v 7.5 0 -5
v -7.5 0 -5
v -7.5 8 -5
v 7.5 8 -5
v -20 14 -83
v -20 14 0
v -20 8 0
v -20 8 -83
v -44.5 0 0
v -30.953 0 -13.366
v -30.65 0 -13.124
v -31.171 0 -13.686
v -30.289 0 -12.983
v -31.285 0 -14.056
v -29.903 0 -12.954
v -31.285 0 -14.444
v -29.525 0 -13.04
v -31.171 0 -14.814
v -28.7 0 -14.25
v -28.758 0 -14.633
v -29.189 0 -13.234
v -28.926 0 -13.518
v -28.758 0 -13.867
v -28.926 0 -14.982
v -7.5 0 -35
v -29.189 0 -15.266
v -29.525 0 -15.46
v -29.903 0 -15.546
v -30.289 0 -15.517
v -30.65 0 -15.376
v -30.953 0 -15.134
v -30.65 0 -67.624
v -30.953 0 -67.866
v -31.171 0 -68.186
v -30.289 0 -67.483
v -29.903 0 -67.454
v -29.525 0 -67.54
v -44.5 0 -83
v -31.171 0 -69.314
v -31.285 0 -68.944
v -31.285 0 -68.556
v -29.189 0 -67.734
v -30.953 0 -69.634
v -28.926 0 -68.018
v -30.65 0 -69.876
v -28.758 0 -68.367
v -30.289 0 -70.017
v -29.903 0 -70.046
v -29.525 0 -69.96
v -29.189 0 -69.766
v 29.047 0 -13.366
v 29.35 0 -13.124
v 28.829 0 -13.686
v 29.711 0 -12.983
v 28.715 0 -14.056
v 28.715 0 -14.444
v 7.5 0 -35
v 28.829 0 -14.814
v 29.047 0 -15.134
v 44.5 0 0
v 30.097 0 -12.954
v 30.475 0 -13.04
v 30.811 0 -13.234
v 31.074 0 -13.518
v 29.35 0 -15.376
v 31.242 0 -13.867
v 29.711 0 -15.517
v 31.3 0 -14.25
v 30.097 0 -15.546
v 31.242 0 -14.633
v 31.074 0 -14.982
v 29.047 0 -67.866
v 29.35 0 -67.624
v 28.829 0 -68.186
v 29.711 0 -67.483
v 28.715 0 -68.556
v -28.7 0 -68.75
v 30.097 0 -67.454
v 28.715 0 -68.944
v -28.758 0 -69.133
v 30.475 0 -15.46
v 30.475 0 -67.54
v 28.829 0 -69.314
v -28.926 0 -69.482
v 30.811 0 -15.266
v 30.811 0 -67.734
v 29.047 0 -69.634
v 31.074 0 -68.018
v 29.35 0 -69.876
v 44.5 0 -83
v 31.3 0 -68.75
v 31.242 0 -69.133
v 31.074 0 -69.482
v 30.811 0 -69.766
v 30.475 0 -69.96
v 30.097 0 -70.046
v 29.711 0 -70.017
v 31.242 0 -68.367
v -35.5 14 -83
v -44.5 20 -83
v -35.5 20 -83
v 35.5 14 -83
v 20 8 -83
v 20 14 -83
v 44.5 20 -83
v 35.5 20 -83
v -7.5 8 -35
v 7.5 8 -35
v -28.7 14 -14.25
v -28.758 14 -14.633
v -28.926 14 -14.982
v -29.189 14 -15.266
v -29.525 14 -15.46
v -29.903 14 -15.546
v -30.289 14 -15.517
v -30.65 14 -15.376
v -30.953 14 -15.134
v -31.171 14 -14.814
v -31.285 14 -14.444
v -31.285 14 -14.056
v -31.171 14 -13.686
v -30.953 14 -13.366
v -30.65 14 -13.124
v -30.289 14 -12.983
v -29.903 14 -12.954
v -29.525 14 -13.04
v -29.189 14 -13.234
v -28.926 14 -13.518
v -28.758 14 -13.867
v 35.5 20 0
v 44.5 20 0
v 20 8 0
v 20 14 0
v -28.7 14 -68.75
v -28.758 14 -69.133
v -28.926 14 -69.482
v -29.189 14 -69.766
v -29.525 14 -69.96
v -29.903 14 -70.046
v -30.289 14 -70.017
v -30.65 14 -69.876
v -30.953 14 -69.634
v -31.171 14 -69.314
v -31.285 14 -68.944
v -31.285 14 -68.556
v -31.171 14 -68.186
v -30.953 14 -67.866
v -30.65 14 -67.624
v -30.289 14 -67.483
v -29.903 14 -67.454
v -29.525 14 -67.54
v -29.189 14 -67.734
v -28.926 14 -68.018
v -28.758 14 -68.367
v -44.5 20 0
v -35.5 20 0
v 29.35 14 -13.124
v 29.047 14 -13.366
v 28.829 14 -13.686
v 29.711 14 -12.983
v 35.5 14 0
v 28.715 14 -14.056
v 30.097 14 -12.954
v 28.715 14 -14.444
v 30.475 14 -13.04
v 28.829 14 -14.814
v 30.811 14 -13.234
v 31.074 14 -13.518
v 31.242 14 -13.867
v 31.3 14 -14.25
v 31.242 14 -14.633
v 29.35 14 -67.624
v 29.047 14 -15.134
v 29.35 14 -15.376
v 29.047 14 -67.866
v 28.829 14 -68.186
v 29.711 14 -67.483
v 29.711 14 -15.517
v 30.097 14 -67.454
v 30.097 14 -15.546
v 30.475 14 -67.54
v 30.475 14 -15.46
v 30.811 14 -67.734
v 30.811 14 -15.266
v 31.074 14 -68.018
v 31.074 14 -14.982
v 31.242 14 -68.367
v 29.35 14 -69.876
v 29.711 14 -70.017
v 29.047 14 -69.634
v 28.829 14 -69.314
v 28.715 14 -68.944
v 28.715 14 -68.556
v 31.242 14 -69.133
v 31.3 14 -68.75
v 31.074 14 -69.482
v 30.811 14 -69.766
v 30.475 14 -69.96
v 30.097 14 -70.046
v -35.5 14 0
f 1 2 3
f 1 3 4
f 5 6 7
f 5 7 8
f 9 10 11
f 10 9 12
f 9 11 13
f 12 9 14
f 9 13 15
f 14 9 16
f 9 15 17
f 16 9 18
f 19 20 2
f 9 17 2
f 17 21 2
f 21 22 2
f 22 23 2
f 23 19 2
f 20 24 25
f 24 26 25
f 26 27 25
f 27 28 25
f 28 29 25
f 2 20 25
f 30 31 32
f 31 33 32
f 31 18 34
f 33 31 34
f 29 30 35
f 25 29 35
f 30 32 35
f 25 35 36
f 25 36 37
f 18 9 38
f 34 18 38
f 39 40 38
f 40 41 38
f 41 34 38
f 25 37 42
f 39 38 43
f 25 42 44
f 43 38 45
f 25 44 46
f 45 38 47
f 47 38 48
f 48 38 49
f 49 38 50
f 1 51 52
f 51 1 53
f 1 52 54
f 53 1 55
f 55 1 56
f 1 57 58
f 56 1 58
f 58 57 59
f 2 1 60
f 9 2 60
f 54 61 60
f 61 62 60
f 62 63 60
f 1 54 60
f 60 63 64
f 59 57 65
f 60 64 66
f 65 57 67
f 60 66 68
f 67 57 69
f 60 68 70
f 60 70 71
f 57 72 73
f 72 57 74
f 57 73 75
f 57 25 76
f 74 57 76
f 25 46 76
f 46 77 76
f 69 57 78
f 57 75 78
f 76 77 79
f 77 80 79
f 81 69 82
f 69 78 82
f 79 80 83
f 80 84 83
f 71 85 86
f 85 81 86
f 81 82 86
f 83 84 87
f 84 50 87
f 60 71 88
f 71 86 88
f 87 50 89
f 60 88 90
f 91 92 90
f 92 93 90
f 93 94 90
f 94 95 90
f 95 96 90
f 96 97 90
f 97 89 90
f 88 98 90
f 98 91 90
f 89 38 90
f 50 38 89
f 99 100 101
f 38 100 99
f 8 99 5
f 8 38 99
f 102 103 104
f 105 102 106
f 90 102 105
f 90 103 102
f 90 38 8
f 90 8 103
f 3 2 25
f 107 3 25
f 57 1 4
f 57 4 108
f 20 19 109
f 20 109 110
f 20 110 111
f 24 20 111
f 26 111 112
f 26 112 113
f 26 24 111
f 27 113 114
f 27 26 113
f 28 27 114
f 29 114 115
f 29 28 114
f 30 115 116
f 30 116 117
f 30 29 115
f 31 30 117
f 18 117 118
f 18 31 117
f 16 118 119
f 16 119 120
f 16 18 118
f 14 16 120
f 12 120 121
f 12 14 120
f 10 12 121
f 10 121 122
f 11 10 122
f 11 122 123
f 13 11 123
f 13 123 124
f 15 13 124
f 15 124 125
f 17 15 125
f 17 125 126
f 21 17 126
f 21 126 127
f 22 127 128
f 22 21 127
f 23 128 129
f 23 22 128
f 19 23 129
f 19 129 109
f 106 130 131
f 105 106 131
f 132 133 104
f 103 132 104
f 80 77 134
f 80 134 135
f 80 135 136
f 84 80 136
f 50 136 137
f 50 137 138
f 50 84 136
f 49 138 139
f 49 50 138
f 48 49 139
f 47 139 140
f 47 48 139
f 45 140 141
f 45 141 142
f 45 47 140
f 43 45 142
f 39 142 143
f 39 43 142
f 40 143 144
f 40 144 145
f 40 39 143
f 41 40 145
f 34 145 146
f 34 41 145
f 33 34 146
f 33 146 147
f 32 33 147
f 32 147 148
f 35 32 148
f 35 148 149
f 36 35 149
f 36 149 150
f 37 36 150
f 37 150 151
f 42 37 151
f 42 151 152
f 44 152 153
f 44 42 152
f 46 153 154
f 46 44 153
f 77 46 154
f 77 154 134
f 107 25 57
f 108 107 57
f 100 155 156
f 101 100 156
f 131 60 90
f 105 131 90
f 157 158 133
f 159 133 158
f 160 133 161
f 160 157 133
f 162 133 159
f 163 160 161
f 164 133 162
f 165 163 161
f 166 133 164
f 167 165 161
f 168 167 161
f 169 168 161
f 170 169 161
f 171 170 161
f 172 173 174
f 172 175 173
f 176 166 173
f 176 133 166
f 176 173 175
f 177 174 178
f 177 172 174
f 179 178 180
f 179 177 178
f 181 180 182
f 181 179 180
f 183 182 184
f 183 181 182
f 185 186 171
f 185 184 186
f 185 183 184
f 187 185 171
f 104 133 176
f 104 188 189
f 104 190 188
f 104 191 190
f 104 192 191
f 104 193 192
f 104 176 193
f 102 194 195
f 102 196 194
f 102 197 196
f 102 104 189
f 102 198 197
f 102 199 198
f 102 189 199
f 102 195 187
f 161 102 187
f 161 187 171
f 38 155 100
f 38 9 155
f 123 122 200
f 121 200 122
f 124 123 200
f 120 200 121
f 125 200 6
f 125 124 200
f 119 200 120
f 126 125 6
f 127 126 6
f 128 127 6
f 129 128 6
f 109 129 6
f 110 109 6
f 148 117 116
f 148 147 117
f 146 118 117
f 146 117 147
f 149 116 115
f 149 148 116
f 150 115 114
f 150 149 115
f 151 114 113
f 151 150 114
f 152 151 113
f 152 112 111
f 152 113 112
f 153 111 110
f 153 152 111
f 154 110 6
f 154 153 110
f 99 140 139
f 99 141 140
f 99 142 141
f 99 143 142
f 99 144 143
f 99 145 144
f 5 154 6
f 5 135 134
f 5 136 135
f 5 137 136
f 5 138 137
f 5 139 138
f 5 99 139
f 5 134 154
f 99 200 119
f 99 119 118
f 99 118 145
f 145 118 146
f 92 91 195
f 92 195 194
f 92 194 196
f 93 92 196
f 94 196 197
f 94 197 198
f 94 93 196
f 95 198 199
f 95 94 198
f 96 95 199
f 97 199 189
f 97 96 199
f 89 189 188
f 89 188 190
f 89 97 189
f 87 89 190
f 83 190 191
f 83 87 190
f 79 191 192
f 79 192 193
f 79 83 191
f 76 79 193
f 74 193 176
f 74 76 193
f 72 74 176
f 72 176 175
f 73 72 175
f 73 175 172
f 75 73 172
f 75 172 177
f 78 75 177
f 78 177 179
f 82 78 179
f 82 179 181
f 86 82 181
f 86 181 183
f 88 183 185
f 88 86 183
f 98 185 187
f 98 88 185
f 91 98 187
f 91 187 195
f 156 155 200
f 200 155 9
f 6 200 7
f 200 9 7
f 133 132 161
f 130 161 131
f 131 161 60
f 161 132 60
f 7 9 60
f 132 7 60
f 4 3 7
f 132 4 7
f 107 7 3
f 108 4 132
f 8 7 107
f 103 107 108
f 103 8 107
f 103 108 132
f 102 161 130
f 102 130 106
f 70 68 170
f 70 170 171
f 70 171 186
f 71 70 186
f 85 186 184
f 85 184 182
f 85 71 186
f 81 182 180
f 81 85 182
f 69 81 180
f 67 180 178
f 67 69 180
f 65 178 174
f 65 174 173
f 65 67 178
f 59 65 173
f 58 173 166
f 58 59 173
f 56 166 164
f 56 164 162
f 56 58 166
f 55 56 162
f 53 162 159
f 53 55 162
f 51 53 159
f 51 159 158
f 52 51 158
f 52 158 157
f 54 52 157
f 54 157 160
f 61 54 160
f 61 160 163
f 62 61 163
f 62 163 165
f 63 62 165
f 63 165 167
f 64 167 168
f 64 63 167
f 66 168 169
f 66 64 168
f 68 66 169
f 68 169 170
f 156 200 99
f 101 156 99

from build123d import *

# Parameters (mm, degrees)
SKETCH1_W           = 89
SKETCH1_H           = 83
SKETCH1_R           = 1.3
SKETCH1_W_2         = 15
SKETCH1_H_2         = 30
MAIN_BODY_DEPTH     = 14
SKETCH2_W           = 40
SKETCH2_H           = 83
SCREW_GROOVE_DEPTH  = 6
SKETCH4_W           = 9
SKETCH4_H           = 83
BOSS_EXTRUDE2_DEPTH = 6


with BuildPart() as part:
    # Sketch1 → Main Body (new body)
    with BuildSketch(Plane(origin=(0, 0, 0), x_dir=(1, 0, 0), z_dir=(0, 1, 0))):
        with Locations((0, 41.5)):
            Rectangle(SKETCH1_W, SKETCH1_H)
        with Locations((30, 68.75)):
            Circle(SKETCH1_R, mode=Mode.SUBTRACT)
        with Locations((-30, 68.75)):
            Circle(SKETCH1_R, mode=Mode.SUBTRACT)
        with Locations((-30, 14.25)):
            Circle(SKETCH1_R, mode=Mode.SUBTRACT)
        with Locations((30, 14.25)):
            Circle(SKETCH1_R, mode=Mode.SUBTRACT)
        with Locations((0, 20)):
            Rectangle(SKETCH1_W_2, SKETCH1_H_2, mode=Mode.SUBTRACT)
    extrude(amount=MAIN_BODY_DEPTH)

    # Sketch2 → Screw Groove (cut)
    with BuildSketch(Plane(origin=(0, 14, 0), x_dir=(1, 0, 0), z_dir=(0, 1, 0))):
        with Locations((0, 41.5)):
            Rectangle(SKETCH2_W, SKETCH2_H)
    extrude(amount=-SCREW_GROOVE_DEPTH, mode=Mode.SUBTRACT)

    # Sketch4 → Boss-Extrude2 (add)
    with BuildSketch(Plane(origin=(0, 14, 0), x_dir=(1, 0, 0), z_dir=(0, 1, 0))):
        with Locations((-40, 41.5)):
            Rectangle(SKETCH4_W, SKETCH4_H)
        with Locations((40, 41.5)):
            Rectangle(SKETCH4_W, SKETCH4_H)
    extrude(amount=BOSS_EXTRUDE2_DEPTH)


solid = part.part
